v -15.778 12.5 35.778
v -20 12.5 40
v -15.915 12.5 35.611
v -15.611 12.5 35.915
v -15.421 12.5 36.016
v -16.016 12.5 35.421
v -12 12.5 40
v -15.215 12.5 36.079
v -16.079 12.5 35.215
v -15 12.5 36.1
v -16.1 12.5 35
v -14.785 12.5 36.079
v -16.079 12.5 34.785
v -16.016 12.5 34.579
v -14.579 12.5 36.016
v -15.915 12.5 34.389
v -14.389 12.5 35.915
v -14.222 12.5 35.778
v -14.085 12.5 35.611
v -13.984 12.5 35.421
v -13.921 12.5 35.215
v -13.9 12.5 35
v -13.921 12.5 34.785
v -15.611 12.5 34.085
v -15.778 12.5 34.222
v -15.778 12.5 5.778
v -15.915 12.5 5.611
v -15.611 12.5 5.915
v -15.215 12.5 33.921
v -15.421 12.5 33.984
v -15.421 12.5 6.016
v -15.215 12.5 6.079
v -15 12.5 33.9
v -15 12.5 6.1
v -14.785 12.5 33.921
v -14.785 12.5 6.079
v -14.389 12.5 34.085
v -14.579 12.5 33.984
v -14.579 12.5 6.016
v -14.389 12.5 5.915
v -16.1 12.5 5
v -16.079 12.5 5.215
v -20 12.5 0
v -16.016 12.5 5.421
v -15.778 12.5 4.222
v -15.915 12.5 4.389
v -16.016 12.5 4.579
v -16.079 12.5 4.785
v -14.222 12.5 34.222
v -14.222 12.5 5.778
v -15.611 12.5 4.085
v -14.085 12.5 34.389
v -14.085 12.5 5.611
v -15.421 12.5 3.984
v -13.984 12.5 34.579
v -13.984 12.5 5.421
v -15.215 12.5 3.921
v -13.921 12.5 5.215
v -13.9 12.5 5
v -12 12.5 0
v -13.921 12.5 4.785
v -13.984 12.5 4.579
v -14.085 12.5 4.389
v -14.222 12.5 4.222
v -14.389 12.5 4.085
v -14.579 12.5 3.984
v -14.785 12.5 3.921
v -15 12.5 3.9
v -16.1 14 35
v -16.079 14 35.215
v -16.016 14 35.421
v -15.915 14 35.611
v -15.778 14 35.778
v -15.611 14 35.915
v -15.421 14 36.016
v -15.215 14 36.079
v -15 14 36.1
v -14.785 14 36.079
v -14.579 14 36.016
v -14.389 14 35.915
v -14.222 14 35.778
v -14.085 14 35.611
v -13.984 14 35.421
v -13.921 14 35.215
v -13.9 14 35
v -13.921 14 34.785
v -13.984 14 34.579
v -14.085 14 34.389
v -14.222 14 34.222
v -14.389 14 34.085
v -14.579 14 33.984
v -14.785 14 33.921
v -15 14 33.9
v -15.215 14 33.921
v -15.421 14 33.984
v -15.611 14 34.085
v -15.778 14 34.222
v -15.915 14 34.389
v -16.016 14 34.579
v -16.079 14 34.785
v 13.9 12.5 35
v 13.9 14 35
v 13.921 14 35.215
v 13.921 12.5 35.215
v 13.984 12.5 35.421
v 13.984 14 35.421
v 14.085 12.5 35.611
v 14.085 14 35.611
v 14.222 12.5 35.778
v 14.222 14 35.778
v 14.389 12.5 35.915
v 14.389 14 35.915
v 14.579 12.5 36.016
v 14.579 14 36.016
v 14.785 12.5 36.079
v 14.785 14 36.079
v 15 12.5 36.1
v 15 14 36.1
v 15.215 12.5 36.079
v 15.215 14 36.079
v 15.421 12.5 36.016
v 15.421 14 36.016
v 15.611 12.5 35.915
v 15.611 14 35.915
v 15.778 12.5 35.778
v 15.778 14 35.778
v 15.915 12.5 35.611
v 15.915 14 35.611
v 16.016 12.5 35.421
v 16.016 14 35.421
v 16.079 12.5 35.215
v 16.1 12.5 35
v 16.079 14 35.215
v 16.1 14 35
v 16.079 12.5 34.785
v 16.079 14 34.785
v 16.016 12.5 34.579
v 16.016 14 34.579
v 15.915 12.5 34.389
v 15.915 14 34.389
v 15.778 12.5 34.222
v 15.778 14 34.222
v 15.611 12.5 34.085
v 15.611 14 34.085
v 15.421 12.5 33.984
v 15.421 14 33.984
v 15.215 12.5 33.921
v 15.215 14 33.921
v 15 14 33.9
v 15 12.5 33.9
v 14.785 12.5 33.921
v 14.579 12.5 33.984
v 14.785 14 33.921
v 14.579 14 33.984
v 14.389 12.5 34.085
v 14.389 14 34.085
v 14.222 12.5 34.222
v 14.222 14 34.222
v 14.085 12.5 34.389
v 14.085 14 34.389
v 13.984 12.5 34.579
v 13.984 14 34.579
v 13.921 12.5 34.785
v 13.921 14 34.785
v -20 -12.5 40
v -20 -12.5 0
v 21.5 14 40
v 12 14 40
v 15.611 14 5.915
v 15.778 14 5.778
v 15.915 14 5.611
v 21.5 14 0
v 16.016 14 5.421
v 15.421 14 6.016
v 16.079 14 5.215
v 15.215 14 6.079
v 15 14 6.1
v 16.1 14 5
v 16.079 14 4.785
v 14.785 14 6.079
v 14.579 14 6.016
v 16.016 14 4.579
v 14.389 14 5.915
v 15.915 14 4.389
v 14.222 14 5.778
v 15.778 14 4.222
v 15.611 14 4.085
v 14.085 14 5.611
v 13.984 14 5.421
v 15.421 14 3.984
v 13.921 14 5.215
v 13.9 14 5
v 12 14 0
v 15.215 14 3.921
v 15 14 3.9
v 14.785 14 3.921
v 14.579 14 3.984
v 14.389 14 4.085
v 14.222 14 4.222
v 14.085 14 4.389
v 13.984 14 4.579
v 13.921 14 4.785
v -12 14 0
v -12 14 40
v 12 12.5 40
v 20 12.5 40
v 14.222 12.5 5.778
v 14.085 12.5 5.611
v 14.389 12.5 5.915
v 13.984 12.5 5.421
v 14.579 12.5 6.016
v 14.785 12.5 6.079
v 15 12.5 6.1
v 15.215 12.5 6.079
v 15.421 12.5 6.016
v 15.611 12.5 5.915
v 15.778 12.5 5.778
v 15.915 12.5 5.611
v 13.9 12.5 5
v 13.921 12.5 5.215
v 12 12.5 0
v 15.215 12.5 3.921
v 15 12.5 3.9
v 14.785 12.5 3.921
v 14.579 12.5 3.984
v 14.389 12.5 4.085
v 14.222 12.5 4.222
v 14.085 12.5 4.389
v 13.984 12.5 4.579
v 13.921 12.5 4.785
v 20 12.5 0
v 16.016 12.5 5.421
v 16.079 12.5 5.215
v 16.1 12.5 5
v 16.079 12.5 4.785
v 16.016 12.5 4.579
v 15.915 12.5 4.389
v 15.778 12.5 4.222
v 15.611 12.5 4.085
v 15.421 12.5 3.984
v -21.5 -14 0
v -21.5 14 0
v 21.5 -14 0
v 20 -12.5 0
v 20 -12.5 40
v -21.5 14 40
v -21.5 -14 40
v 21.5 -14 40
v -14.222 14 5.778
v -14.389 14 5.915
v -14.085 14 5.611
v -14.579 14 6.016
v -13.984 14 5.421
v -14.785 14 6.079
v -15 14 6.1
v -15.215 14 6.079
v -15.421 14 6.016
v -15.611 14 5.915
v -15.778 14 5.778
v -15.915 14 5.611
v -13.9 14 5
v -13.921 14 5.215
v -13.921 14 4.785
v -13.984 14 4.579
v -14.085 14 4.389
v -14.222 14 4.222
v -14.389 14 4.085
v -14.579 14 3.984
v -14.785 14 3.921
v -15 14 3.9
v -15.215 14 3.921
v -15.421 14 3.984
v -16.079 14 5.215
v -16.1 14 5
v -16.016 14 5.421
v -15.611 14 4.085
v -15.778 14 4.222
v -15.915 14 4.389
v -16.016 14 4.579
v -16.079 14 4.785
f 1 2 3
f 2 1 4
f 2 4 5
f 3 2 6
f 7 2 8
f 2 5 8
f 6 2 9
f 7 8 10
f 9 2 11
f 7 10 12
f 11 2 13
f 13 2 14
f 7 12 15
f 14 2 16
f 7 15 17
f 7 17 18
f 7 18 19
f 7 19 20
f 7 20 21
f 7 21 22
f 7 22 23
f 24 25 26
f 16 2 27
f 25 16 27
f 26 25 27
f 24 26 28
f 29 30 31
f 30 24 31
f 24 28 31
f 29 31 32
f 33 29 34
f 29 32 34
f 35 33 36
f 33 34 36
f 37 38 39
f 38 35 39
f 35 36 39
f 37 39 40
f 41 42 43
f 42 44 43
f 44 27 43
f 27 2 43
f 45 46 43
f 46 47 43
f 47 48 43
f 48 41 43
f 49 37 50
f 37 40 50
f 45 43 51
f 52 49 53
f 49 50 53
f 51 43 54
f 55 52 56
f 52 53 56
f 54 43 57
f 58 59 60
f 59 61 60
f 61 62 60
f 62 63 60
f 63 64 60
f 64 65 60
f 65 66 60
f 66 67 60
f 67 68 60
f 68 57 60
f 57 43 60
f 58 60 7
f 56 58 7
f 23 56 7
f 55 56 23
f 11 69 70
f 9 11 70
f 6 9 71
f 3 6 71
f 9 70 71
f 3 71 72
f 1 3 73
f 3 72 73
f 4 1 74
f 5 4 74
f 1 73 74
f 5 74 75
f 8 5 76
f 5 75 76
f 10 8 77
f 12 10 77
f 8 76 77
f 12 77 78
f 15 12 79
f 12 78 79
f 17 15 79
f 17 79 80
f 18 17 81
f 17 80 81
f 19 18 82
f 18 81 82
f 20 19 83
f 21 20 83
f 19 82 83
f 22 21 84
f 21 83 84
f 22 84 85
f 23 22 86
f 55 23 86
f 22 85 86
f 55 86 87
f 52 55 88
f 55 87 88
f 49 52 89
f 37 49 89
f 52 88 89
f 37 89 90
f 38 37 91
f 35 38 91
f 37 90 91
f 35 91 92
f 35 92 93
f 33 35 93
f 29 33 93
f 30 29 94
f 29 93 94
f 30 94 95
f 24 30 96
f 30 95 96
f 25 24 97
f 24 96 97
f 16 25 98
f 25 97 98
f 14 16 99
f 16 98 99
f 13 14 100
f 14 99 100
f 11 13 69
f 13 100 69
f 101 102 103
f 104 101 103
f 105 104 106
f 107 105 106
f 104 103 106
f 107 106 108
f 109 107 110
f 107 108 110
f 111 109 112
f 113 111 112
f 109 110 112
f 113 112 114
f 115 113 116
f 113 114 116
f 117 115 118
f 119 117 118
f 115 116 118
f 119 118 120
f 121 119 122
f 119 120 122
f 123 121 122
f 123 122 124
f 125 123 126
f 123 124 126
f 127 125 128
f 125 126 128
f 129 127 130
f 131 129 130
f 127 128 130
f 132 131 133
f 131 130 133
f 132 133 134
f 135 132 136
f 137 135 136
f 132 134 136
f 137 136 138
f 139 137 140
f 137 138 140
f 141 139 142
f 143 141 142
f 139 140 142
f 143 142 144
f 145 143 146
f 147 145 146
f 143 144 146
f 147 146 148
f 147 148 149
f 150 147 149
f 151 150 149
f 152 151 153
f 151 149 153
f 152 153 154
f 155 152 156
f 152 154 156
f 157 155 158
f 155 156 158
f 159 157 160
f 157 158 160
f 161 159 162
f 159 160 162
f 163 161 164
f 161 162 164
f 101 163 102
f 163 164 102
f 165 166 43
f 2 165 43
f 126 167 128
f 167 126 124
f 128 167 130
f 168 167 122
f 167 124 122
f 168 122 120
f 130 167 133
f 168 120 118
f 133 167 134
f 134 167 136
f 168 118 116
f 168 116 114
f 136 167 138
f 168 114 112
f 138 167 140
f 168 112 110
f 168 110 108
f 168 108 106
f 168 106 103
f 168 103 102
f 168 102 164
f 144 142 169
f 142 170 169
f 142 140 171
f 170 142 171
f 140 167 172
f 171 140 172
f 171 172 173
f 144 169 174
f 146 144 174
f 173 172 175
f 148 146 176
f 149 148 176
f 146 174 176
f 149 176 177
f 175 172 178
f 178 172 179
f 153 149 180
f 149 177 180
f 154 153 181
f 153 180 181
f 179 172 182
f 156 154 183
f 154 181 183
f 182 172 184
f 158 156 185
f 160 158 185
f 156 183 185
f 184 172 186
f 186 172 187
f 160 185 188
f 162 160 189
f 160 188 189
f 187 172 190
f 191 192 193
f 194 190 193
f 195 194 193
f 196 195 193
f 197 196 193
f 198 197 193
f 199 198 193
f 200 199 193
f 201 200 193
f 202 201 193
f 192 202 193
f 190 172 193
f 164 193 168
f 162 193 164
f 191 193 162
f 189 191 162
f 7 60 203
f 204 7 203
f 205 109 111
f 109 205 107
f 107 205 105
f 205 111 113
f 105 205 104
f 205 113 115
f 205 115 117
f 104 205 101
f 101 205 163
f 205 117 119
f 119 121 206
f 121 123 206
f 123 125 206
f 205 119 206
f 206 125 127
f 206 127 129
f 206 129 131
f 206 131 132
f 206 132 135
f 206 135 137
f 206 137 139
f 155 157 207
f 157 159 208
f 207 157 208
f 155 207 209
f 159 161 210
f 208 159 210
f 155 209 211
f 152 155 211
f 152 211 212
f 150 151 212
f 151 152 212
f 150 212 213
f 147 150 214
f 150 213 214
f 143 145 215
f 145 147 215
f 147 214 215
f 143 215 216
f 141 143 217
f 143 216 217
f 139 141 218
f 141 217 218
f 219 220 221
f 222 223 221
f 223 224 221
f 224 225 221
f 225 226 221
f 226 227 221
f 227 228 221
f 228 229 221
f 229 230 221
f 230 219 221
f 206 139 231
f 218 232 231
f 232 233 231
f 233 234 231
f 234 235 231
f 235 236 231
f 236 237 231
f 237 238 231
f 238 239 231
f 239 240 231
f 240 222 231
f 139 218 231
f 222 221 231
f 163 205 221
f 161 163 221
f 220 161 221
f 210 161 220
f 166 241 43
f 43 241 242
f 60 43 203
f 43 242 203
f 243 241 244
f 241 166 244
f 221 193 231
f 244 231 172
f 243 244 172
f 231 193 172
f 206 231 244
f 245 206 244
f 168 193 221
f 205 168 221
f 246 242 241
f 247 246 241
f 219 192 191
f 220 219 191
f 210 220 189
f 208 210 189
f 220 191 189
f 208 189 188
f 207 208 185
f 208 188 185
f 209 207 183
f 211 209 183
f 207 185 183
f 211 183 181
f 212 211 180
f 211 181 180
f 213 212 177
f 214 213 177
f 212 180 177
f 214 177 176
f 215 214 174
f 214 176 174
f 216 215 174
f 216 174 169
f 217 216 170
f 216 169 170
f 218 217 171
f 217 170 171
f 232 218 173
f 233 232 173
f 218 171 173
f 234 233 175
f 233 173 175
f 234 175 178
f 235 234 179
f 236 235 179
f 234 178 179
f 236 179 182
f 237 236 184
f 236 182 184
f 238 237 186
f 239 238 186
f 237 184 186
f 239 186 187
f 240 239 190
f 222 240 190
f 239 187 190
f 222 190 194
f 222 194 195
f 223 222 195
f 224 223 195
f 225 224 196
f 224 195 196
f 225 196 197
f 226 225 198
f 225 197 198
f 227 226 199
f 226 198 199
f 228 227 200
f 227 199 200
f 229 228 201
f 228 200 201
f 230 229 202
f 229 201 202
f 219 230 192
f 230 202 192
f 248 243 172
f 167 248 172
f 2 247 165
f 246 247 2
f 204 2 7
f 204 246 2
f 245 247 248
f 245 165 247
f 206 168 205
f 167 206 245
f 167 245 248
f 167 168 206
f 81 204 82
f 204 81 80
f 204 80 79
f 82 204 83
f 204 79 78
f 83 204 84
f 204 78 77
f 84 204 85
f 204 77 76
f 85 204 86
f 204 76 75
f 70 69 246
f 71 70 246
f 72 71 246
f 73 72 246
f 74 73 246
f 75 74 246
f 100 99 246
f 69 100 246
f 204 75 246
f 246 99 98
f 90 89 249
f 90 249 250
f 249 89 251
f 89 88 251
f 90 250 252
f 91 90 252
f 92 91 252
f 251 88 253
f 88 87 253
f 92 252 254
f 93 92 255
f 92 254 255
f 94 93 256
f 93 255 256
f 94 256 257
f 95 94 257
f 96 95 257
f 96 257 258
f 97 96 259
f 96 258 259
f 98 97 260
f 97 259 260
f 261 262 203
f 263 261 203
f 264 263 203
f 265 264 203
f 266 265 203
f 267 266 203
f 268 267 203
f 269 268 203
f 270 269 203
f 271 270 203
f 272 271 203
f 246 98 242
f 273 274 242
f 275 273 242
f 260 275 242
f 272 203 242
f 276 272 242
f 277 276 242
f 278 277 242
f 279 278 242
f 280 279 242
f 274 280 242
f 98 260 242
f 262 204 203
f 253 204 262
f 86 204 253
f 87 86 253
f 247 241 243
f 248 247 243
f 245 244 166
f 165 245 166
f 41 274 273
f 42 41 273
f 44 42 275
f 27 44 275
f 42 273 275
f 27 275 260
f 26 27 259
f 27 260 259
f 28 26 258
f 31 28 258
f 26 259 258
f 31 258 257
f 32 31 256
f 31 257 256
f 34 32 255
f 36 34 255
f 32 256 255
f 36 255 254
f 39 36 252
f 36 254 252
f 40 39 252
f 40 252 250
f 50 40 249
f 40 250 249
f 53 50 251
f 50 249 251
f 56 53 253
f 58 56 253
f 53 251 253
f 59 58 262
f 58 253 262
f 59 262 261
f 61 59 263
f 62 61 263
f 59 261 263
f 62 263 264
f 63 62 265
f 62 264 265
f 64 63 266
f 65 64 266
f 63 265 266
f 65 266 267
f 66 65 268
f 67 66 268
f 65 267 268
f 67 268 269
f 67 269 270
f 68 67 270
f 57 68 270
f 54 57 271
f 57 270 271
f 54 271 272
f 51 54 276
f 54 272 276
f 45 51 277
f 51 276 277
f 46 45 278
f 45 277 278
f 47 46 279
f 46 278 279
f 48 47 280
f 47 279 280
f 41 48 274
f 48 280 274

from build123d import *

# Parameters (mm, degrees)
F1_DEPTH = 40
F2_R     = 1.1
F3_DEPTH = 1.5


with BuildPart() as f1:
    # F0 (on Top) → F1 (new body)
    with BuildSketch(Plane.XY):
        Polygon((-12, 14), (-21.5, 14), (-21.5, -14), (21.5, -14), (21.5, 14), (12, 14), (12, 12.5), (20, 12.5), (20, -12.5), (-20, -12.5), (-20, 12.5), (-12, 12.5), align=None)
    extrude(amount=F1_DEPTH)

    # F2 (on face) → F3 (cut, through all)
    with BuildSketch(Plane(origin=(0, 14, 0), x_dir=(-1, 0, 0), z_dir=(0, 1, 0))):
        with Locations((-15, 35)):
            Circle(F2_R)
        with Locations((15, 35)):
            Circle(F2_R)
        with Locations((-15, 5)):
            Circle(F2_R)
        with Locations((15, 5)):
            Circle(F2_R)
    extrude(amount=-F3_DEPTH, mode=Mode.SUBTRACT)


solid = f1.part
